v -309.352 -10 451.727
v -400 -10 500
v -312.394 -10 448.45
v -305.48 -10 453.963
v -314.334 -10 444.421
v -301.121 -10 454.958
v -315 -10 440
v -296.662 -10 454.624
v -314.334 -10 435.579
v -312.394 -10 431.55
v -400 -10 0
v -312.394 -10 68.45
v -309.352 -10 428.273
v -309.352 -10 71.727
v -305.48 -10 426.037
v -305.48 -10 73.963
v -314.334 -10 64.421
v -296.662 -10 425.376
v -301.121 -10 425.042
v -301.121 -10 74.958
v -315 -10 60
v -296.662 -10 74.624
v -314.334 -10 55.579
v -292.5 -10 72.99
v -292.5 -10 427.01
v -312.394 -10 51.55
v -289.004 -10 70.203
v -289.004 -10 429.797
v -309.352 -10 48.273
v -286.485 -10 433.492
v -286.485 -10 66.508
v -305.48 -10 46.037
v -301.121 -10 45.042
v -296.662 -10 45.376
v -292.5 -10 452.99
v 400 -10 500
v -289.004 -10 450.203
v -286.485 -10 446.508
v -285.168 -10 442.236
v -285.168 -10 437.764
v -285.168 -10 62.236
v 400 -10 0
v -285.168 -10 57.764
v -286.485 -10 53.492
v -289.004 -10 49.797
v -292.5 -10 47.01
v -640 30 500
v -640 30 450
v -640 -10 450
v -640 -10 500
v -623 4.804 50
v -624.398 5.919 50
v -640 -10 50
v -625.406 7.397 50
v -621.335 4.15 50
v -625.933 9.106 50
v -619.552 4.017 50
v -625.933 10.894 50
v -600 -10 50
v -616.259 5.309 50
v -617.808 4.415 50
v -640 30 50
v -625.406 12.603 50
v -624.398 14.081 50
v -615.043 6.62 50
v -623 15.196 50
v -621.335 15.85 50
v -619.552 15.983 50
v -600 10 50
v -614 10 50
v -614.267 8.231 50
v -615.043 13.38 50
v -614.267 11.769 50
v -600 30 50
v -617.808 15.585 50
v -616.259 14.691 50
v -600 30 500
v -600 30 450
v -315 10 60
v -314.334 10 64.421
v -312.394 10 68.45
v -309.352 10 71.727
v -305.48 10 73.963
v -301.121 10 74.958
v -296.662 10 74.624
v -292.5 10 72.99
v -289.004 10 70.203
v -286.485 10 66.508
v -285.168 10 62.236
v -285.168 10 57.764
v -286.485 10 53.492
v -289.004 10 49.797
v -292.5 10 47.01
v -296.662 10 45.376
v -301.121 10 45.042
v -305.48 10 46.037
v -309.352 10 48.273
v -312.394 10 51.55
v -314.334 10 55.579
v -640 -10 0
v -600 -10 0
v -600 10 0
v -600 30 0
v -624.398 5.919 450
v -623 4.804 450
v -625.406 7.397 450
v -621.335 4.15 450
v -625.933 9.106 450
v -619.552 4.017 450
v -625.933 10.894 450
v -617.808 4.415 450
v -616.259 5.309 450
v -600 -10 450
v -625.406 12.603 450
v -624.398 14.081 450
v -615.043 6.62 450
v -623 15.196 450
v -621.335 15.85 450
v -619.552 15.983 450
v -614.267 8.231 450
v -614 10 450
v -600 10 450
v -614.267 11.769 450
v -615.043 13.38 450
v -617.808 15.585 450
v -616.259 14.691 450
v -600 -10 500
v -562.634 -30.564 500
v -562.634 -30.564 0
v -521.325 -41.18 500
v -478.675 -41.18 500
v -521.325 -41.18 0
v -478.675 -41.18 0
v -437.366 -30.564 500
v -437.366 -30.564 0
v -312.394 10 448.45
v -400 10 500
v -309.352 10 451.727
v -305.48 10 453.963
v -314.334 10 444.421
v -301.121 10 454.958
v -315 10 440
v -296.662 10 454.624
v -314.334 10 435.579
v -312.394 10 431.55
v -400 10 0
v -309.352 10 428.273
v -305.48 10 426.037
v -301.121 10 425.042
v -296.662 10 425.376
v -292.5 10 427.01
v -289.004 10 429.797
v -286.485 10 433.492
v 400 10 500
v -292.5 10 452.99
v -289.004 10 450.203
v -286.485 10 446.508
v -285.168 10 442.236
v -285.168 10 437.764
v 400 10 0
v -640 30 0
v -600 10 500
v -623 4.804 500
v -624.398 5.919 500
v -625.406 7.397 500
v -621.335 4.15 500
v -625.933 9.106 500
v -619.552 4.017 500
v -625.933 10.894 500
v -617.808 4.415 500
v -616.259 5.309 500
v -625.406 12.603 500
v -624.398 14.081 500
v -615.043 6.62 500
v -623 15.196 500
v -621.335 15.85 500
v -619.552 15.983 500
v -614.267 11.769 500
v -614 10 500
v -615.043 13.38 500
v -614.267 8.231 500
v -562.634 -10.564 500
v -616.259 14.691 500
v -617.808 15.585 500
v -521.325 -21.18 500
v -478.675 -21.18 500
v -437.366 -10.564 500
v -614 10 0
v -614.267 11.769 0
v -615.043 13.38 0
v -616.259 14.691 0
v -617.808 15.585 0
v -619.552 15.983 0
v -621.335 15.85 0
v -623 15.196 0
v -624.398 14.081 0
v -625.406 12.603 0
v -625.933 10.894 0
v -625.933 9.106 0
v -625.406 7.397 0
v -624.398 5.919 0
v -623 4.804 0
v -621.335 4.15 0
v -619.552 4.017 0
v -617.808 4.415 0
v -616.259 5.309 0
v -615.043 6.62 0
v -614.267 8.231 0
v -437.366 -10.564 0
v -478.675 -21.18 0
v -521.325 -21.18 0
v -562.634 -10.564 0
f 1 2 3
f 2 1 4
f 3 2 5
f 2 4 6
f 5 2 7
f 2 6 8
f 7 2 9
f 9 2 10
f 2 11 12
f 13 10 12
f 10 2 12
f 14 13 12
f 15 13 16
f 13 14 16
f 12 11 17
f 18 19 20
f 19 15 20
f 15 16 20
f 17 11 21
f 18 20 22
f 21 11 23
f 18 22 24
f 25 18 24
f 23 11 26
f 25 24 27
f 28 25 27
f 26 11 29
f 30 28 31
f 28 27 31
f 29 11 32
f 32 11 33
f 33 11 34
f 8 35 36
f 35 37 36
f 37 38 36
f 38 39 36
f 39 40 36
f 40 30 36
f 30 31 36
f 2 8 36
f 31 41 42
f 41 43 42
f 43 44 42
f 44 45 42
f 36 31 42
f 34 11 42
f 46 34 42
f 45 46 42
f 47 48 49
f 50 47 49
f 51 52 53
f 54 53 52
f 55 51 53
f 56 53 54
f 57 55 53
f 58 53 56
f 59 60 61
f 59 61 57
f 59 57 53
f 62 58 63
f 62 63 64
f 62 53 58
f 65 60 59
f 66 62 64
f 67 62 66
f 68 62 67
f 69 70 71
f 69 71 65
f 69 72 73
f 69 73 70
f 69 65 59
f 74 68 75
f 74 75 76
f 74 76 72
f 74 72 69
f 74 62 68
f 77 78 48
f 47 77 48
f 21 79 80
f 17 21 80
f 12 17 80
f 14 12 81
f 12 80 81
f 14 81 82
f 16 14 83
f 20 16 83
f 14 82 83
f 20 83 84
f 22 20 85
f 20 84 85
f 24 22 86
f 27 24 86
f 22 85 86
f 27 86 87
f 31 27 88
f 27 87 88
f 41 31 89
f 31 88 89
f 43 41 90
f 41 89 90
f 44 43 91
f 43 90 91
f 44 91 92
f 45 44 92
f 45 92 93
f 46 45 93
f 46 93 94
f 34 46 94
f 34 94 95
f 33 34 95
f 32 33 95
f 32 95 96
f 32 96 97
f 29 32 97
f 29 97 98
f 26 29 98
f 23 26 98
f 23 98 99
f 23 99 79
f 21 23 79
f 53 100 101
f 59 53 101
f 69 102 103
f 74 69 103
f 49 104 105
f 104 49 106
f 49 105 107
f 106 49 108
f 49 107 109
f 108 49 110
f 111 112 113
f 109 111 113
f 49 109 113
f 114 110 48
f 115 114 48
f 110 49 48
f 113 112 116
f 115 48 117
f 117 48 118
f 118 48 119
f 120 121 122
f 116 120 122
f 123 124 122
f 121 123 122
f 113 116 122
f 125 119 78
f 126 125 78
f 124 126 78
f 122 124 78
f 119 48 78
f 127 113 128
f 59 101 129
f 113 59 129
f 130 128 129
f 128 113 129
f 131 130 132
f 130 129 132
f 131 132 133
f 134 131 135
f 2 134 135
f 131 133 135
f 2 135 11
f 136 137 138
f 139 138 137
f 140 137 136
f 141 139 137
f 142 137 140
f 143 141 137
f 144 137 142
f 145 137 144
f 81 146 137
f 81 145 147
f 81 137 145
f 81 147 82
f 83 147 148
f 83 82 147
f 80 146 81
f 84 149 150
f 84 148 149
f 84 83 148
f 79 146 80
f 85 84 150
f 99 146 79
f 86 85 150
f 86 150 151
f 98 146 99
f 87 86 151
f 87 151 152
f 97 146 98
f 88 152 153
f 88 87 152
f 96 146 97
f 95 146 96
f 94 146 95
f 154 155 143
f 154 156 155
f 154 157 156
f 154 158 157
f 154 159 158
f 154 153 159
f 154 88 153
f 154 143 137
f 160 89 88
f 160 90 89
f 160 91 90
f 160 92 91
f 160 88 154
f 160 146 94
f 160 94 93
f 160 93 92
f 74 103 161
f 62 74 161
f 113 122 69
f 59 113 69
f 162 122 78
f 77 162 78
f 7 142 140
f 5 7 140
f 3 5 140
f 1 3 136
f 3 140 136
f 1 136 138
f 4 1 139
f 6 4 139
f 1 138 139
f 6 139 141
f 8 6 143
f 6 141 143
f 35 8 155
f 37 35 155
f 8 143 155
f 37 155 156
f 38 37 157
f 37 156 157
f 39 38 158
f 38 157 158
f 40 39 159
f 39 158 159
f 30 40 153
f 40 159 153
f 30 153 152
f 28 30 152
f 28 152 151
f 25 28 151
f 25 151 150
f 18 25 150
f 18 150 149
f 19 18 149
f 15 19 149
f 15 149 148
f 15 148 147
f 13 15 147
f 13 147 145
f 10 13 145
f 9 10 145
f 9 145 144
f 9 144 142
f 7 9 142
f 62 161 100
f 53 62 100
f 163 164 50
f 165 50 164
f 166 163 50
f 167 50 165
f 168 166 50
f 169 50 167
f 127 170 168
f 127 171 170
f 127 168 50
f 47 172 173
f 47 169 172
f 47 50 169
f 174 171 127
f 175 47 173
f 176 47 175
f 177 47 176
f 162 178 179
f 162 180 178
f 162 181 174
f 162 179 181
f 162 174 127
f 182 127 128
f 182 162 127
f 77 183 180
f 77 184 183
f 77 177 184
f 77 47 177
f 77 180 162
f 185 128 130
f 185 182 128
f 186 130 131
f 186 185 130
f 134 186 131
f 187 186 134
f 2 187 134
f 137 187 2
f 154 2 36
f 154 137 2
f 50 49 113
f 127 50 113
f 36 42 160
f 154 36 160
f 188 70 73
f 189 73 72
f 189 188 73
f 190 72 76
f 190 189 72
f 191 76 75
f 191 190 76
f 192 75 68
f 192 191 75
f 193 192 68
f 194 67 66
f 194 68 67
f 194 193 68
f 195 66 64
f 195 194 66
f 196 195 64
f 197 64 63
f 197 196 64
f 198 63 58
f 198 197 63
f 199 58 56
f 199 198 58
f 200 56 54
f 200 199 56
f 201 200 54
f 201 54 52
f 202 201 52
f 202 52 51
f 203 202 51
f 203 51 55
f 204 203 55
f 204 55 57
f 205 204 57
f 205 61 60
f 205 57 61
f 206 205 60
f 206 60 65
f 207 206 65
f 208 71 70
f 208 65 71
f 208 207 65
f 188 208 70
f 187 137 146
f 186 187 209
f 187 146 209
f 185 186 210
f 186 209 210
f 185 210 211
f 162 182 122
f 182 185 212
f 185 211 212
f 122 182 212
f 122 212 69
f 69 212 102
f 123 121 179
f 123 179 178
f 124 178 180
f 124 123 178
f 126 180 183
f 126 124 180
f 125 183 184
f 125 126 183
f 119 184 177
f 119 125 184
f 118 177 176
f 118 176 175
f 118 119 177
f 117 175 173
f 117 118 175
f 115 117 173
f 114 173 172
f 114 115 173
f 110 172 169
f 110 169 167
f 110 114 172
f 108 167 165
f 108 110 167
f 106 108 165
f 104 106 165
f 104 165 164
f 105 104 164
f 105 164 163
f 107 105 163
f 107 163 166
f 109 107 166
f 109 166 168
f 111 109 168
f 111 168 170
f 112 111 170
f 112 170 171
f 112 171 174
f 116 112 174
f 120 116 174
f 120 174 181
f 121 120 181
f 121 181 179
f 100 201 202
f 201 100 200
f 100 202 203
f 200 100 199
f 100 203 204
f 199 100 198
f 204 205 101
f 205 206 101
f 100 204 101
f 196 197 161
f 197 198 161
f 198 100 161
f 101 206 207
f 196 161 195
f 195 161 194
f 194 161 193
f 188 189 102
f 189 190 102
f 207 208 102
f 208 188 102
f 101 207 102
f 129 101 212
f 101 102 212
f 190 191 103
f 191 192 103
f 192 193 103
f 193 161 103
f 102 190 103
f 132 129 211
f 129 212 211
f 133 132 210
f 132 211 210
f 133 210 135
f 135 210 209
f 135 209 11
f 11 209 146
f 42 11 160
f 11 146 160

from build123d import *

# Parameters (mm, degrees)
SKETCH_1_W          = 800
SKETCH_1_H          = 20
SKETCH_1_R          = 6
EXTRUDE_1_DEPTH     = 500
SKETCH_5_R          = 15
CUT_EXTRUDE_2_DEPTH = 814.854186619
SKETCH_6_W          = 40
SKETCH_6_H          = 400
CUT_EXTRUDE_3_DEPTH = 816.389199244


with BuildPart() as part:
    # 草图1 → 凸台-拉伸1 (new body)
    # profile 1 of 3: a face of its own
    with BuildSketch(Plane.XY):
        Rectangle(SKETCH_1_W, SKETCH_1_H)
    # profile 2 of 3: a face of its own
    with BuildSketch(Plane.XY):
        with BuildLine():
            ThreePointArc((-600, -10), (-500, -42.522729151), (-400, -10))
            Line((-400, -10), (-400, 10))
            ThreePointArc((-400, 10), (-500, -22.522729151), (-600, 10))
            Line((-600, 10), (-600, -10))
        make_face()
    # profile 3 of 3: a face of its own
    with BuildSketch(Plane.XY):
        Polygon((-640, -10), (-600, -10), (-600, 10), (-600, 30), (-640, 30), align=None)
        with Locations((-620, 10)):
            Circle(SKETCH_1_R, mode=Mode.SUBTRACT)
    extrude(amount=EXTRUDE_1_DEPTH)

    # 草图5 → 切除-拉伸2 (cut, through all)
    with BuildSketch(Plane(origin=(0, 10, 0), x_dir=(1, 0, 0), z_dir=(0, 1, 0))):
        with Locations(Location((-300, -440, 0), (0, 0, 180))):
            Circle(SKETCH_5_R)
        with Locations(Location((-300, -60, 0), (0, 0, 180))):
            Circle(SKETCH_5_R)
    extrude(amount=-CUT_EXTRUDE_2_DEPTH, mode=Mode.SUBTRACT)

    # 草图6 → 切除-拉伸3 (cut, through all)
    with BuildSketch(Plane(origin=(0, 30, 0), x_dir=(1, 0, 0), z_dir=(0, 1, 0))):
        with Locations((-620, -250)):
            Rectangle(SKETCH_6_W, SKETCH_6_H)
    extrude(amount=-CUT_EXTRUDE_3_DEPTH, mode=Mode.SUBTRACT)


solid = part.part
